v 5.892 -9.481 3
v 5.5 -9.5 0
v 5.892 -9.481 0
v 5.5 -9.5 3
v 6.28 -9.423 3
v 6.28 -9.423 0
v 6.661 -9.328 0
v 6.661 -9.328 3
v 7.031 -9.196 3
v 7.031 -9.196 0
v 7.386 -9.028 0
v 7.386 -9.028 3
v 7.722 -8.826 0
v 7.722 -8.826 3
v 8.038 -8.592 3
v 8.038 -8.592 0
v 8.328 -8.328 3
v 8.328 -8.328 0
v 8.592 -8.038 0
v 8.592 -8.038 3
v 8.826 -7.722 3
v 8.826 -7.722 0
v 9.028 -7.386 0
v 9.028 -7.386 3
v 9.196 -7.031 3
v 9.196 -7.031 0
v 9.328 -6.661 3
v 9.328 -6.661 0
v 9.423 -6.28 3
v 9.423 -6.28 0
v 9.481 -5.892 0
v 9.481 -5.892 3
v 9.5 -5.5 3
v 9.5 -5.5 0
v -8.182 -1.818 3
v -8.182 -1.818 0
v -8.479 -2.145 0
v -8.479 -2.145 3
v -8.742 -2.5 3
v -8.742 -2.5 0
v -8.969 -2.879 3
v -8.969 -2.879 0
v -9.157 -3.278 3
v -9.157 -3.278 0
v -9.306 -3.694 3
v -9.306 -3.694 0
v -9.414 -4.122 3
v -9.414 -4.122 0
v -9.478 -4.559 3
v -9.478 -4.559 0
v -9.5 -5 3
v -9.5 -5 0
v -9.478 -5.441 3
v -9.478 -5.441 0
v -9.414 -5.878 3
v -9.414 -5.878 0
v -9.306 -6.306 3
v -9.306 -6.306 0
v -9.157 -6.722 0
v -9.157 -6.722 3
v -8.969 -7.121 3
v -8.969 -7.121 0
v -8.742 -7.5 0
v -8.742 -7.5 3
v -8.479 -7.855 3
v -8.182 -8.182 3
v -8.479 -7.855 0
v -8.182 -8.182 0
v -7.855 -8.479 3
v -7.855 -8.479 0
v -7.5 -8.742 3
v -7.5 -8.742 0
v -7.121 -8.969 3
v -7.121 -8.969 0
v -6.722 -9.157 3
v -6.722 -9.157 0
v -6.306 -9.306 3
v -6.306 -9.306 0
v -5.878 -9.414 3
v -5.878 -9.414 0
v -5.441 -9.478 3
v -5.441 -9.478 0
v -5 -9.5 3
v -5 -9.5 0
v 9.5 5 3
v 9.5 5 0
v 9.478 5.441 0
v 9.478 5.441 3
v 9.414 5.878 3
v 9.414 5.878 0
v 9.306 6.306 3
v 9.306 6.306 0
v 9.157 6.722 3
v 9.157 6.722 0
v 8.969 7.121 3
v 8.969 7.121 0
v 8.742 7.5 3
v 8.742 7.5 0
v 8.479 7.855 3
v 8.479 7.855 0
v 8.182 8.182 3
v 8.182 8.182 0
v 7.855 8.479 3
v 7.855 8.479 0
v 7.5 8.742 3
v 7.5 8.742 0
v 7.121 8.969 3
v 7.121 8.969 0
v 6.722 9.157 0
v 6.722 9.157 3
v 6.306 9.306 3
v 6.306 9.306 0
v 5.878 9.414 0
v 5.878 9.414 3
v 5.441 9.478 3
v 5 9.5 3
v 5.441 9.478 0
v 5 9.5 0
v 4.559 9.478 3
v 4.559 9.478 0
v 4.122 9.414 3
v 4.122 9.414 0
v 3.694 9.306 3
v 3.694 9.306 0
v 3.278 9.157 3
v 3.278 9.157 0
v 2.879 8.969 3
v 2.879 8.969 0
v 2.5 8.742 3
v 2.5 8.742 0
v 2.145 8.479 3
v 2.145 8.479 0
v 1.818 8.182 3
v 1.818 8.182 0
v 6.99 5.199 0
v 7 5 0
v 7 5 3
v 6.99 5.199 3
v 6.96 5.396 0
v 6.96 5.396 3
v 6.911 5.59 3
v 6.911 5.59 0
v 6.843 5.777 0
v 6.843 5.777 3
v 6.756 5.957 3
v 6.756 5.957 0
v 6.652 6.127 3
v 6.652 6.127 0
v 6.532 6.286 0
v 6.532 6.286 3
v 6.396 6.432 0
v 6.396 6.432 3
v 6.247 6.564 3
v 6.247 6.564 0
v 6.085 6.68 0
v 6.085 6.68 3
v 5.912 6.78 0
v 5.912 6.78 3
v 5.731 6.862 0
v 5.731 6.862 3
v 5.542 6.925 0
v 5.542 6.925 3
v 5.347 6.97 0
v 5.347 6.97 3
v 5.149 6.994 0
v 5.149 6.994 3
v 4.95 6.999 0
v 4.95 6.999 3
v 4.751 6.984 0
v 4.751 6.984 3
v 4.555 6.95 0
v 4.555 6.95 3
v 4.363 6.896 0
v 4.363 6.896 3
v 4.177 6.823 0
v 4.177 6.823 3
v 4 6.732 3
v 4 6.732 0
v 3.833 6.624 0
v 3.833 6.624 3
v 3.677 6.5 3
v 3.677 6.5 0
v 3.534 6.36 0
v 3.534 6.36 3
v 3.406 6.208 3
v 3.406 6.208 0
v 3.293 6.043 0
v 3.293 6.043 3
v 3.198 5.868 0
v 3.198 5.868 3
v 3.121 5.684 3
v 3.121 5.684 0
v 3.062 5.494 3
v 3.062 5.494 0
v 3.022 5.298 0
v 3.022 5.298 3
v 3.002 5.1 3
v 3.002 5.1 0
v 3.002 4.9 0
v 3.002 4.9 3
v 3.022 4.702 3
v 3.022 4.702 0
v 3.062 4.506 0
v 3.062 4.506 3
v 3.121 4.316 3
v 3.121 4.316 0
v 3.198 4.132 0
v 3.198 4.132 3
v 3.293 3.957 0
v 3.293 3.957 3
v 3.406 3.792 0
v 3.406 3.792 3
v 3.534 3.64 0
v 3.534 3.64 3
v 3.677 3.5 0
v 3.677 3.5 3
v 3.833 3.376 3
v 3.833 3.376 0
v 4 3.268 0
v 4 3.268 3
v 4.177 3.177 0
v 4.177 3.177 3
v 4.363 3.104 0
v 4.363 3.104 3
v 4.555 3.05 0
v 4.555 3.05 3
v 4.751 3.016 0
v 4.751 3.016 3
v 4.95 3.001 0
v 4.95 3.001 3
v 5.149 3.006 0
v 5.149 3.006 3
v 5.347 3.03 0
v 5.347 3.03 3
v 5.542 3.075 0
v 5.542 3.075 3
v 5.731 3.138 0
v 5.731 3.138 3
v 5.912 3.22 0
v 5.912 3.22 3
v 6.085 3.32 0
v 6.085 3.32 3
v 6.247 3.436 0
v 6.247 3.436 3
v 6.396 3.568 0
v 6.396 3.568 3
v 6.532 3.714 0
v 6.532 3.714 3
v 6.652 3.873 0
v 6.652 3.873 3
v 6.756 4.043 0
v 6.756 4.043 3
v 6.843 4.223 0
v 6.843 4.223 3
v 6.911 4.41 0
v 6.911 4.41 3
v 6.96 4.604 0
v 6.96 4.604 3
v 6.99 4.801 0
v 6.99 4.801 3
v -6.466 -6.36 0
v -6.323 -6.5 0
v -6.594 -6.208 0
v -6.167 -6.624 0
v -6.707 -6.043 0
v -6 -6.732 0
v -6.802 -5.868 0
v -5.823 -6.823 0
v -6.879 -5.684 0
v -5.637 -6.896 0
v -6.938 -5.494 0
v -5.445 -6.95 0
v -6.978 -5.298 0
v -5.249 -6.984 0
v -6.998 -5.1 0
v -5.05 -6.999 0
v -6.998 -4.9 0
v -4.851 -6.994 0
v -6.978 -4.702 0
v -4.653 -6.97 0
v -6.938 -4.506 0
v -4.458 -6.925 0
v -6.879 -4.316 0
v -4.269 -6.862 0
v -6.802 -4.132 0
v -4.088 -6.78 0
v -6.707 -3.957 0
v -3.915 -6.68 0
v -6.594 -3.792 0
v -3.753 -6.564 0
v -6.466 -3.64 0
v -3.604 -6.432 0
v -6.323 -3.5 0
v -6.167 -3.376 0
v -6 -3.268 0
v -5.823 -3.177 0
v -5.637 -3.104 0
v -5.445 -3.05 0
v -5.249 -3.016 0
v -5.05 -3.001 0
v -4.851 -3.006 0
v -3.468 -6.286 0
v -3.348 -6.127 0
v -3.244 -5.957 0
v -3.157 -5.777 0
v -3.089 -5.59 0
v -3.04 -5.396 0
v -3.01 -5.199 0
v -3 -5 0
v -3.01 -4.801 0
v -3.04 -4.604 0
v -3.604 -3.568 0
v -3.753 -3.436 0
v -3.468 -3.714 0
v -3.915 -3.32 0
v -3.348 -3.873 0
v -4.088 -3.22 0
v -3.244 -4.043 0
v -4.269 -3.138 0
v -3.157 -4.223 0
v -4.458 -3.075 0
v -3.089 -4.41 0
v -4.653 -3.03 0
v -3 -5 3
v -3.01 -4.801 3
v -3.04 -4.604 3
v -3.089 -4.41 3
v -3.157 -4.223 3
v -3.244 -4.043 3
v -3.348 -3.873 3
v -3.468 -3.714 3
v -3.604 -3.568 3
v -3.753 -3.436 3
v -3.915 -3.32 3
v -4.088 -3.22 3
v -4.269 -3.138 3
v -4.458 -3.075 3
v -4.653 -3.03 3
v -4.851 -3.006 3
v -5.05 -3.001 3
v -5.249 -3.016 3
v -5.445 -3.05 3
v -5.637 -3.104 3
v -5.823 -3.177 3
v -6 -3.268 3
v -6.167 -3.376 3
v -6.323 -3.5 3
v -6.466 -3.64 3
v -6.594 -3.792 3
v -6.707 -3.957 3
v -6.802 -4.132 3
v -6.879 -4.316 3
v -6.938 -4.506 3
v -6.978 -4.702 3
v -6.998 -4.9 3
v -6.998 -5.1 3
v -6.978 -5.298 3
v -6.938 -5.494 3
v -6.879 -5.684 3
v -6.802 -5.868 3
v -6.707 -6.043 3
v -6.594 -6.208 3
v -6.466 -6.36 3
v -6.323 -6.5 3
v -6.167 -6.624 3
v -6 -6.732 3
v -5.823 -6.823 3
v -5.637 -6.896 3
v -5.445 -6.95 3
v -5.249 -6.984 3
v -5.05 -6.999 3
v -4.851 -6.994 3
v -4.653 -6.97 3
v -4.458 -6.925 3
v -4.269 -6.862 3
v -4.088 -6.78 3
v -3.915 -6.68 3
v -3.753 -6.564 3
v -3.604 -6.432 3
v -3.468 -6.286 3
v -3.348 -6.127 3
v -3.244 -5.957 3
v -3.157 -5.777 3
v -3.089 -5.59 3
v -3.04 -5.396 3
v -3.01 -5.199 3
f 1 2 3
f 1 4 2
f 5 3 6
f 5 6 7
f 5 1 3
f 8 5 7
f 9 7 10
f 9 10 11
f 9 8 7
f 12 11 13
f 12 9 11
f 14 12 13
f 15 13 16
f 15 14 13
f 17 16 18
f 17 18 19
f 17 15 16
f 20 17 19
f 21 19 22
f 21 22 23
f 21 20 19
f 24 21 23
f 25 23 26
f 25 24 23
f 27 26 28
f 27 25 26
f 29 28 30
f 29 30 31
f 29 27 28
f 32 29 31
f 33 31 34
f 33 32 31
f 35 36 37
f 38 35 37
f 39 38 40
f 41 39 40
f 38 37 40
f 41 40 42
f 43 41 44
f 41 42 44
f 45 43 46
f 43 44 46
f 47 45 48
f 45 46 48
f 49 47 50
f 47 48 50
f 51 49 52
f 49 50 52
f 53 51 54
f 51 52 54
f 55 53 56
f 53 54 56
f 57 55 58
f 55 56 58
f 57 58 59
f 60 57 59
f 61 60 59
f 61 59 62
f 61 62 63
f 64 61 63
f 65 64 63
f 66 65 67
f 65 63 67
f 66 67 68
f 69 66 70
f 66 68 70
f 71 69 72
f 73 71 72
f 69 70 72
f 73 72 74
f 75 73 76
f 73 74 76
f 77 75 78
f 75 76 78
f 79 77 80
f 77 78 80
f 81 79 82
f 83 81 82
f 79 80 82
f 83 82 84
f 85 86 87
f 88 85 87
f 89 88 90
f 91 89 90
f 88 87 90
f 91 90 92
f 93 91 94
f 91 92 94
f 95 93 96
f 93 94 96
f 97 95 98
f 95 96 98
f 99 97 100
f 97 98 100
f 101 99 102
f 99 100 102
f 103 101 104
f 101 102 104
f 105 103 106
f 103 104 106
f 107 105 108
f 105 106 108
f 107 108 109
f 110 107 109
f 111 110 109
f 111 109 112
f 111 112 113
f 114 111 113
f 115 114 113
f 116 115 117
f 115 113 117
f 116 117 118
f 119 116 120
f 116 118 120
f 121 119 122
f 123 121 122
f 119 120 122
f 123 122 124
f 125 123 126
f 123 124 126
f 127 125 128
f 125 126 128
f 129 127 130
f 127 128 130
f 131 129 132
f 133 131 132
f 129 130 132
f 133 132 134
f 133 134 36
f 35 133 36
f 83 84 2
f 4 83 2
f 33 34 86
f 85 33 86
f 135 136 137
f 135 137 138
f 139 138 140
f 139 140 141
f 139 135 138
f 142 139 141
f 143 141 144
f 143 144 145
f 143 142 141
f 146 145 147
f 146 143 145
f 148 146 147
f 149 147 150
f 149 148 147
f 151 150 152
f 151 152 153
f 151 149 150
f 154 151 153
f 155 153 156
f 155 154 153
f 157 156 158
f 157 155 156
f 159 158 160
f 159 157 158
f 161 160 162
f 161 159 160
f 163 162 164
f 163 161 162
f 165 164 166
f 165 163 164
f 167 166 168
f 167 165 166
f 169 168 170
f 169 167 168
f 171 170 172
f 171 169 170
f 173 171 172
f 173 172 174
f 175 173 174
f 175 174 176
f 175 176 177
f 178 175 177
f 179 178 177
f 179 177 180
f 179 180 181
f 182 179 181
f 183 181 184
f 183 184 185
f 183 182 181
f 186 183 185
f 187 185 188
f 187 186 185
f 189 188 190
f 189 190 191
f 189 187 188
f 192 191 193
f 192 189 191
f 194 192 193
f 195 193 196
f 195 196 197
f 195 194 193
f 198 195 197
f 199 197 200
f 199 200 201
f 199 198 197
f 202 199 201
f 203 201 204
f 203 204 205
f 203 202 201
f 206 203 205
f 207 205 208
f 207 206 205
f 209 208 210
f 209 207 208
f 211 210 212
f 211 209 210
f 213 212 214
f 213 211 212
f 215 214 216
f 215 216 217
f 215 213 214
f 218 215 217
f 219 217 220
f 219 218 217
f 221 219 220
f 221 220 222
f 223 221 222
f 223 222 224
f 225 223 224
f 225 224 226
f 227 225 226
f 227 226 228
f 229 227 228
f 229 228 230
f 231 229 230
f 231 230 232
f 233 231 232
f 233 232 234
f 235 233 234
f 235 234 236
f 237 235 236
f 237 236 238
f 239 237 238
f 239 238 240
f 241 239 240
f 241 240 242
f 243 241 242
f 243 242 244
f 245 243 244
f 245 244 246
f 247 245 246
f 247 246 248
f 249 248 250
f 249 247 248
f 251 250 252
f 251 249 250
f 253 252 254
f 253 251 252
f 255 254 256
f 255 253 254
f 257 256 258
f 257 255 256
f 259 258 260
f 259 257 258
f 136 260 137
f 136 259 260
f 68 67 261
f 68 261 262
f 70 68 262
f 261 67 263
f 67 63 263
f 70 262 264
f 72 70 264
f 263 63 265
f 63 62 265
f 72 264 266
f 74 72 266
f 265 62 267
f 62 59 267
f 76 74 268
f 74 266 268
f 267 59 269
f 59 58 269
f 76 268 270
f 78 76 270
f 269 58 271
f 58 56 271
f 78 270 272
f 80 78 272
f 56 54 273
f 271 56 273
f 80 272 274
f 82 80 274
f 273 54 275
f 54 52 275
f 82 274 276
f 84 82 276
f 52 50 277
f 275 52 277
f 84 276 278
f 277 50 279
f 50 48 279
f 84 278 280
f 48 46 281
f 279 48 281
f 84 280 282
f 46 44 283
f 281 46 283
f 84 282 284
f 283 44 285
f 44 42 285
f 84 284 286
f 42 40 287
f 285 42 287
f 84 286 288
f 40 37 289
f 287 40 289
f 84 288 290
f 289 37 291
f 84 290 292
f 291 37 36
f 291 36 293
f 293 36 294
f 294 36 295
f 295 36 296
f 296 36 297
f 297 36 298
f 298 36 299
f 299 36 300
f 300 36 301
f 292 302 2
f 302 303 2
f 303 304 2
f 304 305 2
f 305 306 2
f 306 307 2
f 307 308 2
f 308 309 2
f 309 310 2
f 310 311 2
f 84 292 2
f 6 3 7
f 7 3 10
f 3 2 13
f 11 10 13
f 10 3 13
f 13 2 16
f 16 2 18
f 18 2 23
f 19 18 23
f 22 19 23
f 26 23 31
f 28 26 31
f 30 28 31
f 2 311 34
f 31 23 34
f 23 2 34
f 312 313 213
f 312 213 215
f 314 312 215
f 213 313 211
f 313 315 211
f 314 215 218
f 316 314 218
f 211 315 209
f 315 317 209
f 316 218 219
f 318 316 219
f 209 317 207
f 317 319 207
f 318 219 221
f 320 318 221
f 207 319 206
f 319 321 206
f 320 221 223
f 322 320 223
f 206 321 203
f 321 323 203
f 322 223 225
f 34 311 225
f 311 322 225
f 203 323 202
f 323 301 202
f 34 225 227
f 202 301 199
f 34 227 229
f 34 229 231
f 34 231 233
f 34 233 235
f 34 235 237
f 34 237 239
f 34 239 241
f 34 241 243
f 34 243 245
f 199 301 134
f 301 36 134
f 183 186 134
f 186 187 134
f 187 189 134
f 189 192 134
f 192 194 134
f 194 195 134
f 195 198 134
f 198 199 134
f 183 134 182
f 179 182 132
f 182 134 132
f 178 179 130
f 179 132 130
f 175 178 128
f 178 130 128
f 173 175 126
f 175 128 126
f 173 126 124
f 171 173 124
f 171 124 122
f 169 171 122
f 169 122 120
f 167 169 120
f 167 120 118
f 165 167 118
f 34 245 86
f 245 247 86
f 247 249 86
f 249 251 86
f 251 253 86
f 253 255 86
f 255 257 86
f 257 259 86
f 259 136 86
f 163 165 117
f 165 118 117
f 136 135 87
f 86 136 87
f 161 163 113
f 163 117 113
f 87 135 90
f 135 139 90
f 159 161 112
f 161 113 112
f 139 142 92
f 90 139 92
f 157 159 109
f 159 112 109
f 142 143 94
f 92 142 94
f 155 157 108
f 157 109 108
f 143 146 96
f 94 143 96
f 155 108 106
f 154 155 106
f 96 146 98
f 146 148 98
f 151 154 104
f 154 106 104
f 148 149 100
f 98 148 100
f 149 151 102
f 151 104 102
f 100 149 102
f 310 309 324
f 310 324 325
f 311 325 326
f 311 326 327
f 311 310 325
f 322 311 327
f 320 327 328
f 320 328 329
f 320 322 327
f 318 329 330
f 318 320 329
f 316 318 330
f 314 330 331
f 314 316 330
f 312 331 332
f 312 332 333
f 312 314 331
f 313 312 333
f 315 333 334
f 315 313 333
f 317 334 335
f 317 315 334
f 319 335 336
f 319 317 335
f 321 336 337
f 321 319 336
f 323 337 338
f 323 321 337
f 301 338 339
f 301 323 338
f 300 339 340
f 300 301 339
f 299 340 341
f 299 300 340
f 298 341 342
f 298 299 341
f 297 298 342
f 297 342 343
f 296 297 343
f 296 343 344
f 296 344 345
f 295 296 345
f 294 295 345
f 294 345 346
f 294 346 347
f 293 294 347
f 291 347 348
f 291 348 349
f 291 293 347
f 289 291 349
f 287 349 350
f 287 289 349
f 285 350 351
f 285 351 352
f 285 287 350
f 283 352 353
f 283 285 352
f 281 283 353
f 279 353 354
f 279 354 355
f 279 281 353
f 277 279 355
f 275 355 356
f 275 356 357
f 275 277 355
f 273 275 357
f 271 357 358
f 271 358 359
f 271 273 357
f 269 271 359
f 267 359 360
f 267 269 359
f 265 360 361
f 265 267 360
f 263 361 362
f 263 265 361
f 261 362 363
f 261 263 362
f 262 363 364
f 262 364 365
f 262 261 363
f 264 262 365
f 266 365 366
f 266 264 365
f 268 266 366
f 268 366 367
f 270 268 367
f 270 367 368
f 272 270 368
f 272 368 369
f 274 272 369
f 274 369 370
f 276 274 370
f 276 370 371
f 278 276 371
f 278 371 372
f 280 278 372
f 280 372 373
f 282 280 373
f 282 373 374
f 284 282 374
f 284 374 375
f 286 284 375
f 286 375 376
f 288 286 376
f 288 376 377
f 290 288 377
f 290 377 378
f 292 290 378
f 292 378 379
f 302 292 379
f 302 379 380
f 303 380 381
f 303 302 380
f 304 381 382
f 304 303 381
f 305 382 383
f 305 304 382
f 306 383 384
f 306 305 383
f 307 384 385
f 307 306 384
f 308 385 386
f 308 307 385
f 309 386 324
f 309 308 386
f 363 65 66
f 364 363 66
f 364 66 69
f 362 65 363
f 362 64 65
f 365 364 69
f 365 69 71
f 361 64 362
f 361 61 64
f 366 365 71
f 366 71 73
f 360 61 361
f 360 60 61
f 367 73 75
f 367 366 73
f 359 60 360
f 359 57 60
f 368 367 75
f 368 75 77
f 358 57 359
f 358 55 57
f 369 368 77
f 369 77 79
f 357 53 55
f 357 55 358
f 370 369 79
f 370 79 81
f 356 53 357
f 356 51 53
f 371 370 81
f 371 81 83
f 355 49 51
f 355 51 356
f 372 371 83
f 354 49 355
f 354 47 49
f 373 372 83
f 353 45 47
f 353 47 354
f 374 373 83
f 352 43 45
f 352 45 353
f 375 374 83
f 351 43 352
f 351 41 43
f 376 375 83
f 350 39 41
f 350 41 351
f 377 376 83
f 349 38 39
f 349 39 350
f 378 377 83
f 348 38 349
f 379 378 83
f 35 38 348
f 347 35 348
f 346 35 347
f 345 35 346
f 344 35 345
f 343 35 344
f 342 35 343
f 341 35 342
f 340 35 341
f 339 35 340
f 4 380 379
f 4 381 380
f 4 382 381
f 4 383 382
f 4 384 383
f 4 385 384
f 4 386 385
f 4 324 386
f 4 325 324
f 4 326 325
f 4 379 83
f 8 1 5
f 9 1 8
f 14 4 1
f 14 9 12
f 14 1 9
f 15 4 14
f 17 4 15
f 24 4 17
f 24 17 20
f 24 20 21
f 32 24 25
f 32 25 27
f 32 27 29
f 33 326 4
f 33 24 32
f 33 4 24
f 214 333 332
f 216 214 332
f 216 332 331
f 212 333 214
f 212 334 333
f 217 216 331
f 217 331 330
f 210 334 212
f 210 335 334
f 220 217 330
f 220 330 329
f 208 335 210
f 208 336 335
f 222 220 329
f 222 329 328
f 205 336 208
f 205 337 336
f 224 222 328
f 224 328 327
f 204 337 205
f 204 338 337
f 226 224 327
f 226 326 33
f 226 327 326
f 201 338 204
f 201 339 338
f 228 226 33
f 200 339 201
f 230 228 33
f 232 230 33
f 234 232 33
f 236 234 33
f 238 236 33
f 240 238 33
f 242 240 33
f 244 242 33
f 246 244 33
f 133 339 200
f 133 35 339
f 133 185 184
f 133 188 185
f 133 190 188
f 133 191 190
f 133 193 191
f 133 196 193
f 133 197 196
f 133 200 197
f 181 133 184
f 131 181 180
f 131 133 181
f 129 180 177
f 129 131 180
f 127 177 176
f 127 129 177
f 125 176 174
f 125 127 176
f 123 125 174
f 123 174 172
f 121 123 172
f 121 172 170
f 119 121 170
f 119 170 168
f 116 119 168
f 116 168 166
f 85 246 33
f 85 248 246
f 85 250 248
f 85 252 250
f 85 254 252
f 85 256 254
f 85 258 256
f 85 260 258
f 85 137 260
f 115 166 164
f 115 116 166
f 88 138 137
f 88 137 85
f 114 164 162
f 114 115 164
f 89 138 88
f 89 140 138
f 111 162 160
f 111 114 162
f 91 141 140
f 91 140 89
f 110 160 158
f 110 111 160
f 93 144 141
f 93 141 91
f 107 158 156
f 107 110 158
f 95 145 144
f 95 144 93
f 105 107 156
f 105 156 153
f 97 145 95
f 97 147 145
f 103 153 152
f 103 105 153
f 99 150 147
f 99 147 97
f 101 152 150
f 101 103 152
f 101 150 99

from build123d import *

# Parameters (mm, degrees)
ESQUISSE1_R        = 2
BOSS_EXTRU_1_DEPTH = 3
CONG_1_R           = 4


with BuildPart() as part:
    # Esquisse1 → Boss.-Extru.1 (new body)
    with BuildSketch(Plane.XY):
        with BuildLine():
            Line((-5, -9.5), (9.5, -9.5))
            Line((9.5, -9.5), (9.5, 5))
            ThreePointArc((9.5, 5), (6.722075446, 9.157457896), (1.818019485, 8.181980515))
            Line((1.818019485, 8.181980515), (-8.181980515, -1.818019485))
            ThreePointArc((-8.181980515, -1.818019485), (-9.157457896, -6.722075446), (-5, -9.5))
        make_face()
        with Locations((5, 5)):
            Circle(ESQUISSE1_R, mode=Mode.SUBTRACT)
        with Locations((-5, -5)):
            Circle(ESQUISSE1_R, mode=Mode.SUBTRACT)
    extrude(amount=BOSS_EXTRU_1_DEPTH)

    # Congé1
    cong_1_edges = [part.edges().sort_by_distance(p)[0] for p in [
        (9.5, -9.5, 1.5),
    ]]
    fillet(cong_1_edges, radius=CONG_1_R)


solid = part.part
